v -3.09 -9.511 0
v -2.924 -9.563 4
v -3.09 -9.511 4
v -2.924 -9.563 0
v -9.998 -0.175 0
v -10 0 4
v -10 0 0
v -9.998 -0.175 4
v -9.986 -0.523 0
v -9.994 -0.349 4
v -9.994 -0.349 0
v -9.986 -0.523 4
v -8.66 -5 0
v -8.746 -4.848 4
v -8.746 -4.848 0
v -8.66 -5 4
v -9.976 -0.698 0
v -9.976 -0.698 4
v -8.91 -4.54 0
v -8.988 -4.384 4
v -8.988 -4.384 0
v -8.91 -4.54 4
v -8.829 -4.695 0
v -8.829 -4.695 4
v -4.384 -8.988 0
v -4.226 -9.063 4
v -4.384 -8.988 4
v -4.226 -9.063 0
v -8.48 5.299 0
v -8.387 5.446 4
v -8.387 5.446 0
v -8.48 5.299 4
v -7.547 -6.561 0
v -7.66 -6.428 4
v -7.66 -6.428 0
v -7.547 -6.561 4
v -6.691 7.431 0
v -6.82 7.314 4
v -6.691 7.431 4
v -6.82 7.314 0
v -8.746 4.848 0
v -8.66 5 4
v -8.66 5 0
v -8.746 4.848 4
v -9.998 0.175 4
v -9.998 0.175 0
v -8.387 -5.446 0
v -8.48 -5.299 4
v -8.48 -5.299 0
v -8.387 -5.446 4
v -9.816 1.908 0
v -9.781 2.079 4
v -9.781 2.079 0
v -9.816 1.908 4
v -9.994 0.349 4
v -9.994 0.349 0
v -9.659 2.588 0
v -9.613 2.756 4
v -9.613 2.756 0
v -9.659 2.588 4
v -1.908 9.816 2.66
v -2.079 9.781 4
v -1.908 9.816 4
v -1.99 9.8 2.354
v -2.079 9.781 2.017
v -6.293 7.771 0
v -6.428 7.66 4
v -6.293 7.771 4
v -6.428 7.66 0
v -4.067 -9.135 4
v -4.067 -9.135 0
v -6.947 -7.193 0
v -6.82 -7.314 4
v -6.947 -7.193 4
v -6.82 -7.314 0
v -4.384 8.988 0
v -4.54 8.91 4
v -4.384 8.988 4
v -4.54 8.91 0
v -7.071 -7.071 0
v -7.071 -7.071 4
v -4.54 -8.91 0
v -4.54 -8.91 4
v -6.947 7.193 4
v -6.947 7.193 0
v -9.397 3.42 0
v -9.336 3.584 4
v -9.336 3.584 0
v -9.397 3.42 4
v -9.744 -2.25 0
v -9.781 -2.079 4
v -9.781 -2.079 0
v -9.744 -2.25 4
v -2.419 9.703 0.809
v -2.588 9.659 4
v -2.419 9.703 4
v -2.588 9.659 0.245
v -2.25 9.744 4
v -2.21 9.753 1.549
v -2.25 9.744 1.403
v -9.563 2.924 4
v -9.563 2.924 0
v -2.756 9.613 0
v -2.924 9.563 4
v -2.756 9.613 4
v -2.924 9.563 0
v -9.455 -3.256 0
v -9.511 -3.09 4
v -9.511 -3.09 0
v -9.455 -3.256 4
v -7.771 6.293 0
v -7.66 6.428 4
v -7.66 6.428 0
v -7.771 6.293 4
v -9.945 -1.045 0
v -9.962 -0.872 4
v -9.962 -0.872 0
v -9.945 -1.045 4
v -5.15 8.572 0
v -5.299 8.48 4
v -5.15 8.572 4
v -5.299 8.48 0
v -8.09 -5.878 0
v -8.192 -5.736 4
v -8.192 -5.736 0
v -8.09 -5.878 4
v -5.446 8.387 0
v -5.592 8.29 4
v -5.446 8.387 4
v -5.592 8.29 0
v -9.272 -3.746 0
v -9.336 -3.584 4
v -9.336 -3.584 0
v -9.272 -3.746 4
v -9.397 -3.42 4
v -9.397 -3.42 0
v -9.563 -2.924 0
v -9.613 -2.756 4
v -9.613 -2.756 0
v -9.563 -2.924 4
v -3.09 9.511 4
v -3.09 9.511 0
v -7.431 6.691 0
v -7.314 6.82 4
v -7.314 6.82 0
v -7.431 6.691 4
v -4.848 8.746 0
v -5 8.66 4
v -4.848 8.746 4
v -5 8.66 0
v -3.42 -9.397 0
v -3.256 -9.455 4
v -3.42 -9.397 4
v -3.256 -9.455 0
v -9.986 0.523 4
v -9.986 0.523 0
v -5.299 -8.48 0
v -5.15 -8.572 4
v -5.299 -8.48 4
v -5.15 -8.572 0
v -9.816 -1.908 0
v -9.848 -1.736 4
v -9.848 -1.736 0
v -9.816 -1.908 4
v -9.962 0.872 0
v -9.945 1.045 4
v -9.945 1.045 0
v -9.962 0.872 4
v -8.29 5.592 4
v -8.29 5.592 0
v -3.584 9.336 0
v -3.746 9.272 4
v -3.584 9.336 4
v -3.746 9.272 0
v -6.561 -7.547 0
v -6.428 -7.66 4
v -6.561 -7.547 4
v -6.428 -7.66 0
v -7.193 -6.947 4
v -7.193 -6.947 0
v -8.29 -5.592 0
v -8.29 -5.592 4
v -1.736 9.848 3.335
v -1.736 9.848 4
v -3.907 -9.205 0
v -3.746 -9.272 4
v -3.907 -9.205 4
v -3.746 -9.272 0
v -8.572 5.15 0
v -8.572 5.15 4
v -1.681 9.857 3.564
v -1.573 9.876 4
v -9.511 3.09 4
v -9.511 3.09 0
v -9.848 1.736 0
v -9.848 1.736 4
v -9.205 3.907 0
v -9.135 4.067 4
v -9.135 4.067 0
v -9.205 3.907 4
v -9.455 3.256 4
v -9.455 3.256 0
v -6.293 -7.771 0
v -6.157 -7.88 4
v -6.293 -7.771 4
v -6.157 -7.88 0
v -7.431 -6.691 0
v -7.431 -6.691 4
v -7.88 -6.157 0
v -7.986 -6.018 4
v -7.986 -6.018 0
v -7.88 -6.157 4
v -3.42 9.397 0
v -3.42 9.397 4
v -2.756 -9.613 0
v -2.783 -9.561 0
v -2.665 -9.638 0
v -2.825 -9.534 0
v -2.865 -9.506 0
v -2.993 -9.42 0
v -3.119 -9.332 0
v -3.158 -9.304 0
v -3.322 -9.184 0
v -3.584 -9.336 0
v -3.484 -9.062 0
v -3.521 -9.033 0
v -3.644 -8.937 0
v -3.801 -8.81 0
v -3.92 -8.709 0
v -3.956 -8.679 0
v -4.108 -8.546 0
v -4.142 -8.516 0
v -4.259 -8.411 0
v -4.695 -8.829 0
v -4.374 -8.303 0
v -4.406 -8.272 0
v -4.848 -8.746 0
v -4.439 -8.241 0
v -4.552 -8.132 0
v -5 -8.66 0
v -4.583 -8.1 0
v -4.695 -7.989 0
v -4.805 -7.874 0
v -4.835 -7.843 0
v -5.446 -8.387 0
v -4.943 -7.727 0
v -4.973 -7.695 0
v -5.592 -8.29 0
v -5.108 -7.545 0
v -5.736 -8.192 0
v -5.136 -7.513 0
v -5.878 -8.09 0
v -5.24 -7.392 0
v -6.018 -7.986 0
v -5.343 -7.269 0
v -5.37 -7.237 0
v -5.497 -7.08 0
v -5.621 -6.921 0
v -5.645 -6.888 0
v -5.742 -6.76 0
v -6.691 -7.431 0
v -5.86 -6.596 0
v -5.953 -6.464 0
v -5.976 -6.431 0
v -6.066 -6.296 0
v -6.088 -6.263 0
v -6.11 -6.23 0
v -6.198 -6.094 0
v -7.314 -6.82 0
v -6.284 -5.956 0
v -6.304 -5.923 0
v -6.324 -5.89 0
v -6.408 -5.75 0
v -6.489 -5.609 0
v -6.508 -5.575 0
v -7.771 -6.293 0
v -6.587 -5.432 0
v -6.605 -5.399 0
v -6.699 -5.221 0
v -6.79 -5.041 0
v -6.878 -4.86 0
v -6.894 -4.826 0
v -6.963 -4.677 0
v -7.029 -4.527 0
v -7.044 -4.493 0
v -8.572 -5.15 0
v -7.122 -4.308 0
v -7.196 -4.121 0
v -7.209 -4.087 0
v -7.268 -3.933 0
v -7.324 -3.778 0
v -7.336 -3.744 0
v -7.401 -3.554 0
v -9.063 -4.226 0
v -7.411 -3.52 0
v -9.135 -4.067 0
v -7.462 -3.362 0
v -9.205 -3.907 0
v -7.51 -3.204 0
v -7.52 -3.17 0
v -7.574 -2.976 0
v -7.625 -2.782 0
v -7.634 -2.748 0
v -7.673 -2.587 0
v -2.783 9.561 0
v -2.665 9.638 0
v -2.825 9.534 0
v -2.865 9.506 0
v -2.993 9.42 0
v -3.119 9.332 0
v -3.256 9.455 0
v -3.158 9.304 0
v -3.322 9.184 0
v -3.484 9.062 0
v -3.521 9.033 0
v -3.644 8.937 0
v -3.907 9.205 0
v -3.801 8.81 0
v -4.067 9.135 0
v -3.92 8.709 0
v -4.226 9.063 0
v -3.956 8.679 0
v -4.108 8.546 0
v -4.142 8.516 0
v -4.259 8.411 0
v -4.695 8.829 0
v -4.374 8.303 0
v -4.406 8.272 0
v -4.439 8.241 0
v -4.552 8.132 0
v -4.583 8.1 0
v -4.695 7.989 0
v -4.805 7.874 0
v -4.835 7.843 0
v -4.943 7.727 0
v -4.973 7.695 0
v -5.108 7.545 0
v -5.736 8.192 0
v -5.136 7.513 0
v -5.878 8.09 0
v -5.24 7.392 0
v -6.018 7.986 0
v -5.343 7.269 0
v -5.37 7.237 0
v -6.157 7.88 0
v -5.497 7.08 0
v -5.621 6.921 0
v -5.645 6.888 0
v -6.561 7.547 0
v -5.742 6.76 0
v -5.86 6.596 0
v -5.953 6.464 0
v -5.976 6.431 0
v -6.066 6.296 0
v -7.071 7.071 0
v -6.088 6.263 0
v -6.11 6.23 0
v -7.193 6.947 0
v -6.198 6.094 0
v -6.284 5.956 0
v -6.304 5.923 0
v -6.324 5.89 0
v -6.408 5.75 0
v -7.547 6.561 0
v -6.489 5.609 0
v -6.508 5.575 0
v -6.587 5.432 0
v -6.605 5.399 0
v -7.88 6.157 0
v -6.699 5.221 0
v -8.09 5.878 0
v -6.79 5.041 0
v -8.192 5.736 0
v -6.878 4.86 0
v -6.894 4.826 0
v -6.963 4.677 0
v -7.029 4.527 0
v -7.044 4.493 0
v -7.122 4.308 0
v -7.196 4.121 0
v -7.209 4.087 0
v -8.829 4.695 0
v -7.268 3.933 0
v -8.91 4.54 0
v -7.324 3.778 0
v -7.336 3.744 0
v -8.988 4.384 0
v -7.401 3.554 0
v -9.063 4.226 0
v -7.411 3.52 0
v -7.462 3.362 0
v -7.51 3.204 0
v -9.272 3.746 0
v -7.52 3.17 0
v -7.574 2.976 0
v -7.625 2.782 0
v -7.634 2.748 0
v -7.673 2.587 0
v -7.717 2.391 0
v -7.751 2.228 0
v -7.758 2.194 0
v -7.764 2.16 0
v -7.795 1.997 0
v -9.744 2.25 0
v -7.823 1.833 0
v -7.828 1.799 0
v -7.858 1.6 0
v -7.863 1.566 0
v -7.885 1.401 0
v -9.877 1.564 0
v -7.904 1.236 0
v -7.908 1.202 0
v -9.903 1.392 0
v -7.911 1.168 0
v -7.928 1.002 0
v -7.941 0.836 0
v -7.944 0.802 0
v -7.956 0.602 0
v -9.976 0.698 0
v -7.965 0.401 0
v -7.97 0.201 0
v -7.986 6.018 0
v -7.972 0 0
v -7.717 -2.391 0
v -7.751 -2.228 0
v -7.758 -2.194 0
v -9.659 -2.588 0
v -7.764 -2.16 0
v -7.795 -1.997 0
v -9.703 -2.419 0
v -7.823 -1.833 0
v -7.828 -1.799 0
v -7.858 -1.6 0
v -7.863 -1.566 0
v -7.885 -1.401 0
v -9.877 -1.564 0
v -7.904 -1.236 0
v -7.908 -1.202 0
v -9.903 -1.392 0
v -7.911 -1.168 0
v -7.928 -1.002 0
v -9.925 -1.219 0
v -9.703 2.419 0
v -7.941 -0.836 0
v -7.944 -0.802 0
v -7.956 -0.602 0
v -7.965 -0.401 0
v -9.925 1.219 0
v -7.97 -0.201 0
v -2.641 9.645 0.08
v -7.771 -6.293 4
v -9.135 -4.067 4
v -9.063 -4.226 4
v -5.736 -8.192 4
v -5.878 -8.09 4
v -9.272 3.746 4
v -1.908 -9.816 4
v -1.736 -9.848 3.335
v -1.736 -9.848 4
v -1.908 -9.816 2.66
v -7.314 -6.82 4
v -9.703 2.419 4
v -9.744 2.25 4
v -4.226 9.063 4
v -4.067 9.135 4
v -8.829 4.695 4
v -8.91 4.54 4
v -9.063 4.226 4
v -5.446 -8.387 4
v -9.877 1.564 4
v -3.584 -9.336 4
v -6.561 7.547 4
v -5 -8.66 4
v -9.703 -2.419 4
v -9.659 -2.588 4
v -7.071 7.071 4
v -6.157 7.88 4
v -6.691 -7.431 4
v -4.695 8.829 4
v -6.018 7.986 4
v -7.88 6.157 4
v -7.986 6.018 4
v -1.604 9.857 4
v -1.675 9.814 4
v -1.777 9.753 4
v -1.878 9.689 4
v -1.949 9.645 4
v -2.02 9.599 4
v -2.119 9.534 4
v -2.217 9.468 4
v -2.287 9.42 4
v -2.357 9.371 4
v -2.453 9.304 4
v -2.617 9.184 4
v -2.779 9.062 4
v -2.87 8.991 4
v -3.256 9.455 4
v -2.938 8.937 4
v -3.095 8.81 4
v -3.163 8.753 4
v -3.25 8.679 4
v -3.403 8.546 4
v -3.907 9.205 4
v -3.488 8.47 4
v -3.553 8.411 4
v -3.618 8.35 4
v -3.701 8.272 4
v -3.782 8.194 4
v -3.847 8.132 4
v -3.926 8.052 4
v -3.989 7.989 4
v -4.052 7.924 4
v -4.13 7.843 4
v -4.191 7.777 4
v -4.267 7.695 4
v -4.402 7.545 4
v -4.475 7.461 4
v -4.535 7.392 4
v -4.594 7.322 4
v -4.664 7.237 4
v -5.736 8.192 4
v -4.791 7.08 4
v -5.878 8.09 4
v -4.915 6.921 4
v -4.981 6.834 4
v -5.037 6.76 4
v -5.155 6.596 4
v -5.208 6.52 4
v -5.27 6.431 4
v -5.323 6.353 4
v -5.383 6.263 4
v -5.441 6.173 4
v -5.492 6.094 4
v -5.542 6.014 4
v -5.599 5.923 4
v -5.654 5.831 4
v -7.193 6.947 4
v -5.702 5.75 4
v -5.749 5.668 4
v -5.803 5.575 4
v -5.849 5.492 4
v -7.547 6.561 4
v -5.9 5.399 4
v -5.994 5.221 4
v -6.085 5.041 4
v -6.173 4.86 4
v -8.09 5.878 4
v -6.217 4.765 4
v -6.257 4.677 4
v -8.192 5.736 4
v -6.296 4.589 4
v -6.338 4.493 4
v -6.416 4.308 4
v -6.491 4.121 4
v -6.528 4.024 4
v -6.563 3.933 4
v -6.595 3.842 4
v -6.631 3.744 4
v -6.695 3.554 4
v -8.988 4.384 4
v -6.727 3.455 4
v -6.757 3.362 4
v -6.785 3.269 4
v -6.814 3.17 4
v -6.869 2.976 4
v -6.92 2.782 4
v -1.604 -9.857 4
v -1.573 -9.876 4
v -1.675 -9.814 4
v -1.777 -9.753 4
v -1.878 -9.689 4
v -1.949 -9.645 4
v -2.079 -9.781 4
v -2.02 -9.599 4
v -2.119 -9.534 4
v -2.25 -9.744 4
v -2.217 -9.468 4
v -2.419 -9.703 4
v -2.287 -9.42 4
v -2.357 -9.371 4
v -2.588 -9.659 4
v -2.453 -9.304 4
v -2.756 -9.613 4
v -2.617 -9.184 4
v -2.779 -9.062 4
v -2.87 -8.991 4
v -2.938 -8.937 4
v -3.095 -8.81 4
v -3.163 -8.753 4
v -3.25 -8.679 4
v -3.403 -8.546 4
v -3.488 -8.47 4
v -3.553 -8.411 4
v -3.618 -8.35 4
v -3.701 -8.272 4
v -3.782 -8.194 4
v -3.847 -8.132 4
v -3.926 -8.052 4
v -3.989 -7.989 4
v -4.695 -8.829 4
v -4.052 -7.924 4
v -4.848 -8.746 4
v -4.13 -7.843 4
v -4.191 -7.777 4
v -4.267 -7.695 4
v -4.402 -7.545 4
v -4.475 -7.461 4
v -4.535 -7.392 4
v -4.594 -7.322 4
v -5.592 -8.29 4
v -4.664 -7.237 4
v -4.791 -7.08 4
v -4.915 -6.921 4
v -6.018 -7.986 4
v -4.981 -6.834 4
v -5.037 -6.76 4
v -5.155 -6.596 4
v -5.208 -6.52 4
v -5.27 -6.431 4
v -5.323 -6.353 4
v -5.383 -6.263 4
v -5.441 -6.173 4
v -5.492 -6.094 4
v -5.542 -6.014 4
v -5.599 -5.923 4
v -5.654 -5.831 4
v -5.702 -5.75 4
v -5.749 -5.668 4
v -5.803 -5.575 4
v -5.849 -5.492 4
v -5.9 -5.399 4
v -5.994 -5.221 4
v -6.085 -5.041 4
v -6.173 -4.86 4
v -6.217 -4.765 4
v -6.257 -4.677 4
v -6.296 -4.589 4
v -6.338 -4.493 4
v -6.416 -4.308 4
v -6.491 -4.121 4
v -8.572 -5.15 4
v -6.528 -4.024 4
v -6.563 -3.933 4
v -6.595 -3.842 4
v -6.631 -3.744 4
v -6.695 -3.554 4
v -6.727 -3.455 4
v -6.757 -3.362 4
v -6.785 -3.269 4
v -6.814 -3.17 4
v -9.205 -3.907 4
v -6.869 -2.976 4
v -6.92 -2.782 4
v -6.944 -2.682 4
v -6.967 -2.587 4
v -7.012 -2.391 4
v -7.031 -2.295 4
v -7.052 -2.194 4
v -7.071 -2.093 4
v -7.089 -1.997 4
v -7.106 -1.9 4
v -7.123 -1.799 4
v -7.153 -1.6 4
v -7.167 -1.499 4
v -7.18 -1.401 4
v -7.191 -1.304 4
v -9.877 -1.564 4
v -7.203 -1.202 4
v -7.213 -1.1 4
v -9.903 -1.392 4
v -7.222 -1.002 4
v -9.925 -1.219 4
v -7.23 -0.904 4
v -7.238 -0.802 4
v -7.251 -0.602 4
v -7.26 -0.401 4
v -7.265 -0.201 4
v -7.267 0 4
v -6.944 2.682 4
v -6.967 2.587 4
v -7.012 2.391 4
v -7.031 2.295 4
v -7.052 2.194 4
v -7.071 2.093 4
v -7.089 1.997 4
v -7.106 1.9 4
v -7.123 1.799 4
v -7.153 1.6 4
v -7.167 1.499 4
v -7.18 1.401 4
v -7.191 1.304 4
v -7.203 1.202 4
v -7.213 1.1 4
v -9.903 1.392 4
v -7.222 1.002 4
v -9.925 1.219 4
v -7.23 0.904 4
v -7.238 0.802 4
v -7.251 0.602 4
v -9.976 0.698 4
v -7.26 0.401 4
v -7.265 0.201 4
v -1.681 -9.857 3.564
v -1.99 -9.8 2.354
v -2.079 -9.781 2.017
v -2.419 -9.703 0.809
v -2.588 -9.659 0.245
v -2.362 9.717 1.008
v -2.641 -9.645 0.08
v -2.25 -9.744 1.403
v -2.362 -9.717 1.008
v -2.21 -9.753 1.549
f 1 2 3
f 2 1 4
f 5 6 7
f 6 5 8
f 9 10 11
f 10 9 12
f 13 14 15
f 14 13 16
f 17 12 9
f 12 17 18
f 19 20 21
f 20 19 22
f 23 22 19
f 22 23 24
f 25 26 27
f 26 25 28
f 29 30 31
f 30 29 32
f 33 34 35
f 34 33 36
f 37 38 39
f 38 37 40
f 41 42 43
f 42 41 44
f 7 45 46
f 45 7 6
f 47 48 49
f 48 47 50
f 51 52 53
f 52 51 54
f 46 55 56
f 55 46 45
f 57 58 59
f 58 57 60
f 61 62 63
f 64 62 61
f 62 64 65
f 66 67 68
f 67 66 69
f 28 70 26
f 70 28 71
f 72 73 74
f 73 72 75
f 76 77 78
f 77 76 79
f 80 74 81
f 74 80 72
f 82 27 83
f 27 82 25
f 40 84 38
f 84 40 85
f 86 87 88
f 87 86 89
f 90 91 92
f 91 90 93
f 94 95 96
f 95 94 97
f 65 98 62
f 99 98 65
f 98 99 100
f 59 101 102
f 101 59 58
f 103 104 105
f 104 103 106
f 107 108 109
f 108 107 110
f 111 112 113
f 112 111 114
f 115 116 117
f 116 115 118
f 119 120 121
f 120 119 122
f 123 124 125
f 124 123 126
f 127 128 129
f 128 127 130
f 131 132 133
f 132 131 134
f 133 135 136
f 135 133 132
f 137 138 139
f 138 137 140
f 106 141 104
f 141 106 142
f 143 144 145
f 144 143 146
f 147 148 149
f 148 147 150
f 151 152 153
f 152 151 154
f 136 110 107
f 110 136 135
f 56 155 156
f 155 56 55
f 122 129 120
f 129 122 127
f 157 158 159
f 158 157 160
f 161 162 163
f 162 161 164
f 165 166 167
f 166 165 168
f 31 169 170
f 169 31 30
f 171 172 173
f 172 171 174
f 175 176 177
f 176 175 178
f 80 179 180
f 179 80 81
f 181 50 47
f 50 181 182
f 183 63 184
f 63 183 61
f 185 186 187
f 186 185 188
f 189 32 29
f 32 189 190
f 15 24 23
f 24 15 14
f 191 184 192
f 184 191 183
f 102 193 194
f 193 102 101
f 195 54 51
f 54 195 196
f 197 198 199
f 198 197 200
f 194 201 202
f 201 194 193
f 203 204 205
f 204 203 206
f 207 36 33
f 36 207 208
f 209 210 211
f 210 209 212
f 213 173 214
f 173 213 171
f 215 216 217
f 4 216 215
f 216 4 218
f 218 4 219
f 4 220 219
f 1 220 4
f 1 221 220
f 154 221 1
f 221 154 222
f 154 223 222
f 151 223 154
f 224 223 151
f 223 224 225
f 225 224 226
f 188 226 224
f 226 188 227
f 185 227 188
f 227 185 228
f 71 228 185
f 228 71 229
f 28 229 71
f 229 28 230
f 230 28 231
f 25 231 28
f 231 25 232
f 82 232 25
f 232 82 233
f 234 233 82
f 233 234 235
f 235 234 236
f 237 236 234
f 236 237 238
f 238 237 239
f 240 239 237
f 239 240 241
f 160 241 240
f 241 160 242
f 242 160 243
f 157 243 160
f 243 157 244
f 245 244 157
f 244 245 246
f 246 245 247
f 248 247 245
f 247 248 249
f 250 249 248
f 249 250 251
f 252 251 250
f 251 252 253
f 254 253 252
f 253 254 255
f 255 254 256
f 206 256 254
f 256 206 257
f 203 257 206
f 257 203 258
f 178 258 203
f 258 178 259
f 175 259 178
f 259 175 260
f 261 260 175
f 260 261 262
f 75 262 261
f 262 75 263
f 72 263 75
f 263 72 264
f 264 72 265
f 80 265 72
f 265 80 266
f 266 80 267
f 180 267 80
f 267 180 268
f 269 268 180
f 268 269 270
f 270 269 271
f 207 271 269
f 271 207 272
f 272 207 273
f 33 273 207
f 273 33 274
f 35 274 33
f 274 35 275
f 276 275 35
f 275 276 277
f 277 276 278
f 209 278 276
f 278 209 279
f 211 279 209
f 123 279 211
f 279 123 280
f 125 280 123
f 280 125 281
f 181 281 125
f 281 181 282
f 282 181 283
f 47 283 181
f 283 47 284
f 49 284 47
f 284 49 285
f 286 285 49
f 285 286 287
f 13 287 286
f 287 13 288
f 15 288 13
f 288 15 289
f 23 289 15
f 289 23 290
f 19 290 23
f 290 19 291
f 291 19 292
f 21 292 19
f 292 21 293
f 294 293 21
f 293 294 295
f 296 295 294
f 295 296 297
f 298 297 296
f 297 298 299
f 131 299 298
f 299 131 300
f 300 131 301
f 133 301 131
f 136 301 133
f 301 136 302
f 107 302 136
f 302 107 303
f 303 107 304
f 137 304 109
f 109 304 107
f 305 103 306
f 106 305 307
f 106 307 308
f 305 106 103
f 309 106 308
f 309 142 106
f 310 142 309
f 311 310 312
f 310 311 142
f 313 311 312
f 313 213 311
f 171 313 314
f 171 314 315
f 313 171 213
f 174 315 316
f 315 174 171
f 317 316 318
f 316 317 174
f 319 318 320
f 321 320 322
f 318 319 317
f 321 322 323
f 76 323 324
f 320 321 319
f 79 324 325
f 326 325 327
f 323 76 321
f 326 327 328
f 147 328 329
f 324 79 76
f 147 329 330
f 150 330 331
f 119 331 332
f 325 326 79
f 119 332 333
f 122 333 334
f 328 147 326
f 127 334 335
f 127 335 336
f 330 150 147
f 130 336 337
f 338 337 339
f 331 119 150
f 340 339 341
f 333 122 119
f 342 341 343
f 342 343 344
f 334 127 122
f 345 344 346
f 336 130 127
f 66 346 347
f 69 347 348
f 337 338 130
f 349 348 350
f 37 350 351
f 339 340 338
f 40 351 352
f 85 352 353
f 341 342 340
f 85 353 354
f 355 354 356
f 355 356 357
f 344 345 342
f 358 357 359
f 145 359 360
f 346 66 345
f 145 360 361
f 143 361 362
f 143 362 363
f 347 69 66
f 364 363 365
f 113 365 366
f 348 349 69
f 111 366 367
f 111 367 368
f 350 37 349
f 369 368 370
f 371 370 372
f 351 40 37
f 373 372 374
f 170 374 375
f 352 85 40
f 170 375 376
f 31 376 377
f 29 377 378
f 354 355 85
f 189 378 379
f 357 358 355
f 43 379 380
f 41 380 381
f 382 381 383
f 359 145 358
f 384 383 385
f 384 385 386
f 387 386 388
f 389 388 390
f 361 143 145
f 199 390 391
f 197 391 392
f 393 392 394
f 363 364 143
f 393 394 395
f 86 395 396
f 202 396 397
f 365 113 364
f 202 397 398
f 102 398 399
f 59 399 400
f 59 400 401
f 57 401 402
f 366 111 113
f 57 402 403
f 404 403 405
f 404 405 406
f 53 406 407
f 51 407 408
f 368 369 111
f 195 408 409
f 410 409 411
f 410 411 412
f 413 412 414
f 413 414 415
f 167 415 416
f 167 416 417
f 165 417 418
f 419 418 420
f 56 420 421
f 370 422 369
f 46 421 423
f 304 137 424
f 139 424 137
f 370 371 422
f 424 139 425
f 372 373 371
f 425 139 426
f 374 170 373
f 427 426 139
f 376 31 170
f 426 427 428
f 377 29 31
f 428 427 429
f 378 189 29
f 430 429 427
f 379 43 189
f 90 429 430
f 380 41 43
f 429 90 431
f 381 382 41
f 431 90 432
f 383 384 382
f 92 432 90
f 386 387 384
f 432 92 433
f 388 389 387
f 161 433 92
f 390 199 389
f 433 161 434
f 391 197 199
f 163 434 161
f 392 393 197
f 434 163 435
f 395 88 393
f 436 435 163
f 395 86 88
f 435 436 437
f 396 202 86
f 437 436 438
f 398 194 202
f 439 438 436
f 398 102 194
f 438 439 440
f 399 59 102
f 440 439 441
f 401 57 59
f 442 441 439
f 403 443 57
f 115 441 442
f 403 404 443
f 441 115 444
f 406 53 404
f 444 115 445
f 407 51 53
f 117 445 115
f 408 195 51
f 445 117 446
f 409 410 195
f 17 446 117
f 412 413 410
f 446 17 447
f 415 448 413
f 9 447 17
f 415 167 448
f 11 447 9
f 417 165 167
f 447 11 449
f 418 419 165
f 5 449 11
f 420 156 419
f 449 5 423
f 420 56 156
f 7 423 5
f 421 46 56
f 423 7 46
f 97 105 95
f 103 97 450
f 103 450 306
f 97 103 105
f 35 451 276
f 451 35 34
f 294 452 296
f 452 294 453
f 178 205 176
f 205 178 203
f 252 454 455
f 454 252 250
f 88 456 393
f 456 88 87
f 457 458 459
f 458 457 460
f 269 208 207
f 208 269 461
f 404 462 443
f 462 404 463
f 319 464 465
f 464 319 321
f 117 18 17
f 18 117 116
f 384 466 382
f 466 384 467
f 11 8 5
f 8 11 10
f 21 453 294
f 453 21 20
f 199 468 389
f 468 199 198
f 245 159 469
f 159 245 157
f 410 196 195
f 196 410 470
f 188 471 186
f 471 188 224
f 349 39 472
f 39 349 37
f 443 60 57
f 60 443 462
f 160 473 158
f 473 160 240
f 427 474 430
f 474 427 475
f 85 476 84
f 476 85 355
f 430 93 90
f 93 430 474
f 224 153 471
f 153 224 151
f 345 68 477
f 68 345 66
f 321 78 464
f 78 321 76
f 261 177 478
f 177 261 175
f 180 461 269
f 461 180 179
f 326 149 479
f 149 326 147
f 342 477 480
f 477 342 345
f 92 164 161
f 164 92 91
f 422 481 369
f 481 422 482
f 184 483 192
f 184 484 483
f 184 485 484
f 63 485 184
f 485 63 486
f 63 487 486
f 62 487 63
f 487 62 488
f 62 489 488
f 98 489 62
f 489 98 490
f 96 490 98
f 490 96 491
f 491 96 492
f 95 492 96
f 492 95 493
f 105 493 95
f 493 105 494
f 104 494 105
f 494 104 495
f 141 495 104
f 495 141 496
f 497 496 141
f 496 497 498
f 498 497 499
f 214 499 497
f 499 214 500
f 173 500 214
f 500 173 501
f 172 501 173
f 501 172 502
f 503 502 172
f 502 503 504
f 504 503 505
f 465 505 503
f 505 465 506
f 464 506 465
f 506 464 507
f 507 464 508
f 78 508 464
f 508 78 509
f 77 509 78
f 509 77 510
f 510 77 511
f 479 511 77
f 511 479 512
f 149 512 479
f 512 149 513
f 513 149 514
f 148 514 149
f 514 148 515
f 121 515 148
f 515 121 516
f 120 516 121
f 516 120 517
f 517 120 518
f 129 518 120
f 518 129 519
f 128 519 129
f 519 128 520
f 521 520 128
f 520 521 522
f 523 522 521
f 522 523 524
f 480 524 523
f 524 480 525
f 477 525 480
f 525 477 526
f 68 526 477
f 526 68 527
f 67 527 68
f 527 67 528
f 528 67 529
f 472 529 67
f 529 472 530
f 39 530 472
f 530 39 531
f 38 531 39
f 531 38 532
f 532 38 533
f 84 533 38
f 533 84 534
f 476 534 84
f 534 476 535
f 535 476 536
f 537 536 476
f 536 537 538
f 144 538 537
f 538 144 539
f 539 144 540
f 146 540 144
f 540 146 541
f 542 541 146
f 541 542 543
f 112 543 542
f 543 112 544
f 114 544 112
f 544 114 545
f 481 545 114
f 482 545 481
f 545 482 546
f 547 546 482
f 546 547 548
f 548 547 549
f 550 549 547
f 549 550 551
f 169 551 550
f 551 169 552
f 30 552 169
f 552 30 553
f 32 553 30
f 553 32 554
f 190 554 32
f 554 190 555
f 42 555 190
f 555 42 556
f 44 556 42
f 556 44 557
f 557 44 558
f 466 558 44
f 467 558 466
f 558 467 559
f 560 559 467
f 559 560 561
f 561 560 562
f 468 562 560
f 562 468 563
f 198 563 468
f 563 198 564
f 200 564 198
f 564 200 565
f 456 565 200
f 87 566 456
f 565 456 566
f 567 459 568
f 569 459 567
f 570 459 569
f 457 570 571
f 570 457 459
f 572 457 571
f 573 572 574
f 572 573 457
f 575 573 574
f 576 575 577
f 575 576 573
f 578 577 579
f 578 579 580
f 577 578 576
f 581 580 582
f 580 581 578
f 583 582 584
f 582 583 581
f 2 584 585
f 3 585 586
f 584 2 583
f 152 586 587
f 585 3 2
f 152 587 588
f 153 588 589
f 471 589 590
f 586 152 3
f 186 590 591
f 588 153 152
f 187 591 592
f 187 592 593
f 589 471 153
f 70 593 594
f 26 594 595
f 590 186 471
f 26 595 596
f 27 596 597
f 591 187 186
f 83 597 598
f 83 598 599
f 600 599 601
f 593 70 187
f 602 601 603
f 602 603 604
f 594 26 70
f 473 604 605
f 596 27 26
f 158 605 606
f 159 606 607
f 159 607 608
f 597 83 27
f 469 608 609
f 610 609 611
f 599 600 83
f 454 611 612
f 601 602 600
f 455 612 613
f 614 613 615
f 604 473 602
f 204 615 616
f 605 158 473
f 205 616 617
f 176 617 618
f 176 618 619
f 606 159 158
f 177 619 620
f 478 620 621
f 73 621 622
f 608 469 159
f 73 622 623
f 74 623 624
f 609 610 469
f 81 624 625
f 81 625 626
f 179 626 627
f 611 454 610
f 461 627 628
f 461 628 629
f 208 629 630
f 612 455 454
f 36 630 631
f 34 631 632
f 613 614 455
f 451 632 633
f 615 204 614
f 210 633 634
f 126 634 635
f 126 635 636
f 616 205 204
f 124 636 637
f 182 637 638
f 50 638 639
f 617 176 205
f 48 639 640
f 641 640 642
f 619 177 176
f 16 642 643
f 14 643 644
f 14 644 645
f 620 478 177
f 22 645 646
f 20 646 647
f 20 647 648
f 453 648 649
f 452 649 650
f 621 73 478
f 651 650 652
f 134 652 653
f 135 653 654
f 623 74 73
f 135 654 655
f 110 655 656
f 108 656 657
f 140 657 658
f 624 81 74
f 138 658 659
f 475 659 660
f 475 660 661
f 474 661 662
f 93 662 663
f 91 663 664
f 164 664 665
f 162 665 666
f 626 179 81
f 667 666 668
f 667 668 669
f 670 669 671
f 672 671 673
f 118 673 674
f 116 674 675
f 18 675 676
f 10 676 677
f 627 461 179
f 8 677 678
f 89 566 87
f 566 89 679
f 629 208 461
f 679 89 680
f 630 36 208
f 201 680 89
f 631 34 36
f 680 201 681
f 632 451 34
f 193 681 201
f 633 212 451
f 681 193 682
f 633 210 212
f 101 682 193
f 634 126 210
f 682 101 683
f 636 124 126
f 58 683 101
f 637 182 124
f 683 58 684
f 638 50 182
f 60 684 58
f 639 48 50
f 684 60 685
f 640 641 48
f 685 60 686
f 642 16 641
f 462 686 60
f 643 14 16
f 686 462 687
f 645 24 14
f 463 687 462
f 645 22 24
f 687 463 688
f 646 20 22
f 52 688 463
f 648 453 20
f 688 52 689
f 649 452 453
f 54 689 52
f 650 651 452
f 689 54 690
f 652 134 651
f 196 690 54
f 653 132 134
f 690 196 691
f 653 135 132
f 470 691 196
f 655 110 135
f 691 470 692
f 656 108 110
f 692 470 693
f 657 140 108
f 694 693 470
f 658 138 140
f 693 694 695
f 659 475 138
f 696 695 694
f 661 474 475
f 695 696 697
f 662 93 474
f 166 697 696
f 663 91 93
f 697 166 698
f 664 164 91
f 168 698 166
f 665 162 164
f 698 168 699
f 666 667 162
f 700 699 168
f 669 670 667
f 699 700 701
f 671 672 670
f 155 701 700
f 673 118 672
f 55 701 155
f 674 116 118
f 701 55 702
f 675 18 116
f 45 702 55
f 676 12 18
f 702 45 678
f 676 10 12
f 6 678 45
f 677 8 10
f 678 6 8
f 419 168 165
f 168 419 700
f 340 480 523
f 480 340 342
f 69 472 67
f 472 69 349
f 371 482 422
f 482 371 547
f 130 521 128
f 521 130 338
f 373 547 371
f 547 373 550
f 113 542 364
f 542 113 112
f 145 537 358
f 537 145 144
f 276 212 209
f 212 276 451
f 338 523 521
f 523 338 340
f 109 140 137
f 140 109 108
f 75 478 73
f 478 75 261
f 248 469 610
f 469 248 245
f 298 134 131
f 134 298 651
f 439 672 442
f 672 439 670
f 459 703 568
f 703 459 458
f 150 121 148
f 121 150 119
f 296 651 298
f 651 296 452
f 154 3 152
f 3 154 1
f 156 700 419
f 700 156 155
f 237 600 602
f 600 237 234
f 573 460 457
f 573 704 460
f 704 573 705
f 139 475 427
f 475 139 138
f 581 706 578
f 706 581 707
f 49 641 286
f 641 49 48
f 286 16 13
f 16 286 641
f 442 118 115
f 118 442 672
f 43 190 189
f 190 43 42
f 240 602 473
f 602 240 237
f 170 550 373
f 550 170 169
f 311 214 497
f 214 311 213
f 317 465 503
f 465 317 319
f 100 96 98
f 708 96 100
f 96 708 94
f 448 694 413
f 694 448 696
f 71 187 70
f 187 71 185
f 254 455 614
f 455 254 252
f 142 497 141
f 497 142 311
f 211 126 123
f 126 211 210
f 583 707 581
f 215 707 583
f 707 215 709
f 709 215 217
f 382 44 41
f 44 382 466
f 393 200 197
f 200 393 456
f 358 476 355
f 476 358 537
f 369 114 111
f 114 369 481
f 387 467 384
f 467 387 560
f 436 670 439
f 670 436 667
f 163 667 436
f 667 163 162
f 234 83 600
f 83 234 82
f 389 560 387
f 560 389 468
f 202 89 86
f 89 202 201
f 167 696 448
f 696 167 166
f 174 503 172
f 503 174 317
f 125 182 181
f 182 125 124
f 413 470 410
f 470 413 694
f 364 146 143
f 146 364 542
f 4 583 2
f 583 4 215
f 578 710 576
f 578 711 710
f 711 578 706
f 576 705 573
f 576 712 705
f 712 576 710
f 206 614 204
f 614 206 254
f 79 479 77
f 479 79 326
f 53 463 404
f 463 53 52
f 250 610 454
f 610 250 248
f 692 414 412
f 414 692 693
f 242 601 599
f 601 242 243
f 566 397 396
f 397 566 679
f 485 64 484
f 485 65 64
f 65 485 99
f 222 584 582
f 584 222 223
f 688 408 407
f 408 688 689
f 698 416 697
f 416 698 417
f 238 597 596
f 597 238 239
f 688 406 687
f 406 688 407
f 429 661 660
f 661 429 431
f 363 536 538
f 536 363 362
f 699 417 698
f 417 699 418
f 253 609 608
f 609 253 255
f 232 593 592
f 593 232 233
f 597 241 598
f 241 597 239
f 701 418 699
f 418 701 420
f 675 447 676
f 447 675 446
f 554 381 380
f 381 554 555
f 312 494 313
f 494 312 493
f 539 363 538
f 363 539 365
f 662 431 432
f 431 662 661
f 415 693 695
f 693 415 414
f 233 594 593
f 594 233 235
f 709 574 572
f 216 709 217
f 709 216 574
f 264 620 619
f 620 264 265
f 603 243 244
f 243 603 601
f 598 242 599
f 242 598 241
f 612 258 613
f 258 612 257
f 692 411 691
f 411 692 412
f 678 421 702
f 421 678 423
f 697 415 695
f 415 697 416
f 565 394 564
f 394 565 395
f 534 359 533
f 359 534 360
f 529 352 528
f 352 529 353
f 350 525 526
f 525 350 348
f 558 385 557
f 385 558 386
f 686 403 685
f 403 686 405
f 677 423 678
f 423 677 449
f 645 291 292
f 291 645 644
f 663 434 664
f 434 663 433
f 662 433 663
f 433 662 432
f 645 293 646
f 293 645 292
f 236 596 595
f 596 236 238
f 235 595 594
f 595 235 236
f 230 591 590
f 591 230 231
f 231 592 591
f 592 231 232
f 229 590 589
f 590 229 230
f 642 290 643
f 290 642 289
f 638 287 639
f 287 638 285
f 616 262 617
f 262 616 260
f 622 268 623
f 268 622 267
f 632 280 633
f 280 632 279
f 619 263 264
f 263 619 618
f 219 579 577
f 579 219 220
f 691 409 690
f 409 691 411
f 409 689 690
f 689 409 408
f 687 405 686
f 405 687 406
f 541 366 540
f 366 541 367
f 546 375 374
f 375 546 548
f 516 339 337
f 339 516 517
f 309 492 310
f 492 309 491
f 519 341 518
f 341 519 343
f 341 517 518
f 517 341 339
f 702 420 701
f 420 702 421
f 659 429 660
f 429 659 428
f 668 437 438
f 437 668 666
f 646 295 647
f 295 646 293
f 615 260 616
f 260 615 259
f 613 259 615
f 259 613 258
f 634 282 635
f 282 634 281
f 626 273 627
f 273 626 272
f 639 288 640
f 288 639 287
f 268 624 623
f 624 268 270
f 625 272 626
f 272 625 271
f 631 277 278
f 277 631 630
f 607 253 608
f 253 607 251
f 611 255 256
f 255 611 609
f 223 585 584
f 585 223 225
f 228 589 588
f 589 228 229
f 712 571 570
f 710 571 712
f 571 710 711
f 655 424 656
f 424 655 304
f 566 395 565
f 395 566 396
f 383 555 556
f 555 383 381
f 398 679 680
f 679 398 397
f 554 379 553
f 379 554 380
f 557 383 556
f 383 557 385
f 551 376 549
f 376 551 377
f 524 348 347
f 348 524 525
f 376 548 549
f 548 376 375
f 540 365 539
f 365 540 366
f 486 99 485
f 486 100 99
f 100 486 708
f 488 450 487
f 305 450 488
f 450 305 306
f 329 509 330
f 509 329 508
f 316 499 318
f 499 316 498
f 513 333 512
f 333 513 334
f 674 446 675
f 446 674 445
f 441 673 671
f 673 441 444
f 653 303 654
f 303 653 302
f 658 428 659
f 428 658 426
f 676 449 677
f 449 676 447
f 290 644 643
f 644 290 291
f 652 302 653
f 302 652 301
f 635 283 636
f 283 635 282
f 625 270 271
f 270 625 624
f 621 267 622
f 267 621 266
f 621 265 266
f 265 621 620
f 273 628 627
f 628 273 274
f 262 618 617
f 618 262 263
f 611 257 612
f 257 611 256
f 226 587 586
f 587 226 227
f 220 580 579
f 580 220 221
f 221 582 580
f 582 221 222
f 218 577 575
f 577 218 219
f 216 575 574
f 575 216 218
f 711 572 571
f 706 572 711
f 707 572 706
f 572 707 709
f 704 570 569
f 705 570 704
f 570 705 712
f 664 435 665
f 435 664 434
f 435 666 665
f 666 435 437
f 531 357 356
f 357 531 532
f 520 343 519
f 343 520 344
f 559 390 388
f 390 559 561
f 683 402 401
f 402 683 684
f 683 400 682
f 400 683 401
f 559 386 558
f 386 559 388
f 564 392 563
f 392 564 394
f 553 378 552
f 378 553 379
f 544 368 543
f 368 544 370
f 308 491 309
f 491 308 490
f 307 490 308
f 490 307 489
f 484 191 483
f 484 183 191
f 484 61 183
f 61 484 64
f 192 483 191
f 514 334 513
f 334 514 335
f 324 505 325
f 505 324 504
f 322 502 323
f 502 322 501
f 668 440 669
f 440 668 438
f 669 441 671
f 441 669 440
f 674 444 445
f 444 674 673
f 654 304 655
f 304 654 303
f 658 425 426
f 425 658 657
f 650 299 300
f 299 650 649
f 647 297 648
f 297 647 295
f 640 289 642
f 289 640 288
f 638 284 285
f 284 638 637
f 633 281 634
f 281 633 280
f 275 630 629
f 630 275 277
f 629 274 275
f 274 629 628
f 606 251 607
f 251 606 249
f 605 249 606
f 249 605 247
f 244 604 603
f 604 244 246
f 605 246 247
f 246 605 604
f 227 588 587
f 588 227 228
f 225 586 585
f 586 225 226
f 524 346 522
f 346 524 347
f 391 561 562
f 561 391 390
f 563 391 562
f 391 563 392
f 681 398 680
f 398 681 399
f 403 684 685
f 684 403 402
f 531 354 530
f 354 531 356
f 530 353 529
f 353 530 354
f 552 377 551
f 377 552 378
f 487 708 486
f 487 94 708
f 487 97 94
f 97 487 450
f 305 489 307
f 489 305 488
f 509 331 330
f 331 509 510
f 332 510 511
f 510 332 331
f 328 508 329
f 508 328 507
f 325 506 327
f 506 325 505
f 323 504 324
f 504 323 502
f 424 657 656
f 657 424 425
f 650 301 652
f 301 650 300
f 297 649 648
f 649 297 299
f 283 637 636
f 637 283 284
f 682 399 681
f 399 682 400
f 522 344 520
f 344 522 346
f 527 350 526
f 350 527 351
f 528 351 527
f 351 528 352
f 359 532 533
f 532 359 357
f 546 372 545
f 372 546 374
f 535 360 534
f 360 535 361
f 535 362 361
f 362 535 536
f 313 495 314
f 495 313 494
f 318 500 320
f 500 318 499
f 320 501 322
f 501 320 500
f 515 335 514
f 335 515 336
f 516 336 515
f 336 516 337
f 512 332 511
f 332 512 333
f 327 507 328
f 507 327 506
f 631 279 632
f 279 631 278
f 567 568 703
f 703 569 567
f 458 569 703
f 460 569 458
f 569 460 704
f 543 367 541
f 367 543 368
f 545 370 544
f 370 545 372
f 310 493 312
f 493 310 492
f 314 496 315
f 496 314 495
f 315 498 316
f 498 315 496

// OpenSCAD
$fn = 360;
difference() {
	cylinder(r=10, h=4);
	translate([3, 0, -4])
		rotate([0, 10, 0])
			cylinder(r=11.5, h=12);
}
